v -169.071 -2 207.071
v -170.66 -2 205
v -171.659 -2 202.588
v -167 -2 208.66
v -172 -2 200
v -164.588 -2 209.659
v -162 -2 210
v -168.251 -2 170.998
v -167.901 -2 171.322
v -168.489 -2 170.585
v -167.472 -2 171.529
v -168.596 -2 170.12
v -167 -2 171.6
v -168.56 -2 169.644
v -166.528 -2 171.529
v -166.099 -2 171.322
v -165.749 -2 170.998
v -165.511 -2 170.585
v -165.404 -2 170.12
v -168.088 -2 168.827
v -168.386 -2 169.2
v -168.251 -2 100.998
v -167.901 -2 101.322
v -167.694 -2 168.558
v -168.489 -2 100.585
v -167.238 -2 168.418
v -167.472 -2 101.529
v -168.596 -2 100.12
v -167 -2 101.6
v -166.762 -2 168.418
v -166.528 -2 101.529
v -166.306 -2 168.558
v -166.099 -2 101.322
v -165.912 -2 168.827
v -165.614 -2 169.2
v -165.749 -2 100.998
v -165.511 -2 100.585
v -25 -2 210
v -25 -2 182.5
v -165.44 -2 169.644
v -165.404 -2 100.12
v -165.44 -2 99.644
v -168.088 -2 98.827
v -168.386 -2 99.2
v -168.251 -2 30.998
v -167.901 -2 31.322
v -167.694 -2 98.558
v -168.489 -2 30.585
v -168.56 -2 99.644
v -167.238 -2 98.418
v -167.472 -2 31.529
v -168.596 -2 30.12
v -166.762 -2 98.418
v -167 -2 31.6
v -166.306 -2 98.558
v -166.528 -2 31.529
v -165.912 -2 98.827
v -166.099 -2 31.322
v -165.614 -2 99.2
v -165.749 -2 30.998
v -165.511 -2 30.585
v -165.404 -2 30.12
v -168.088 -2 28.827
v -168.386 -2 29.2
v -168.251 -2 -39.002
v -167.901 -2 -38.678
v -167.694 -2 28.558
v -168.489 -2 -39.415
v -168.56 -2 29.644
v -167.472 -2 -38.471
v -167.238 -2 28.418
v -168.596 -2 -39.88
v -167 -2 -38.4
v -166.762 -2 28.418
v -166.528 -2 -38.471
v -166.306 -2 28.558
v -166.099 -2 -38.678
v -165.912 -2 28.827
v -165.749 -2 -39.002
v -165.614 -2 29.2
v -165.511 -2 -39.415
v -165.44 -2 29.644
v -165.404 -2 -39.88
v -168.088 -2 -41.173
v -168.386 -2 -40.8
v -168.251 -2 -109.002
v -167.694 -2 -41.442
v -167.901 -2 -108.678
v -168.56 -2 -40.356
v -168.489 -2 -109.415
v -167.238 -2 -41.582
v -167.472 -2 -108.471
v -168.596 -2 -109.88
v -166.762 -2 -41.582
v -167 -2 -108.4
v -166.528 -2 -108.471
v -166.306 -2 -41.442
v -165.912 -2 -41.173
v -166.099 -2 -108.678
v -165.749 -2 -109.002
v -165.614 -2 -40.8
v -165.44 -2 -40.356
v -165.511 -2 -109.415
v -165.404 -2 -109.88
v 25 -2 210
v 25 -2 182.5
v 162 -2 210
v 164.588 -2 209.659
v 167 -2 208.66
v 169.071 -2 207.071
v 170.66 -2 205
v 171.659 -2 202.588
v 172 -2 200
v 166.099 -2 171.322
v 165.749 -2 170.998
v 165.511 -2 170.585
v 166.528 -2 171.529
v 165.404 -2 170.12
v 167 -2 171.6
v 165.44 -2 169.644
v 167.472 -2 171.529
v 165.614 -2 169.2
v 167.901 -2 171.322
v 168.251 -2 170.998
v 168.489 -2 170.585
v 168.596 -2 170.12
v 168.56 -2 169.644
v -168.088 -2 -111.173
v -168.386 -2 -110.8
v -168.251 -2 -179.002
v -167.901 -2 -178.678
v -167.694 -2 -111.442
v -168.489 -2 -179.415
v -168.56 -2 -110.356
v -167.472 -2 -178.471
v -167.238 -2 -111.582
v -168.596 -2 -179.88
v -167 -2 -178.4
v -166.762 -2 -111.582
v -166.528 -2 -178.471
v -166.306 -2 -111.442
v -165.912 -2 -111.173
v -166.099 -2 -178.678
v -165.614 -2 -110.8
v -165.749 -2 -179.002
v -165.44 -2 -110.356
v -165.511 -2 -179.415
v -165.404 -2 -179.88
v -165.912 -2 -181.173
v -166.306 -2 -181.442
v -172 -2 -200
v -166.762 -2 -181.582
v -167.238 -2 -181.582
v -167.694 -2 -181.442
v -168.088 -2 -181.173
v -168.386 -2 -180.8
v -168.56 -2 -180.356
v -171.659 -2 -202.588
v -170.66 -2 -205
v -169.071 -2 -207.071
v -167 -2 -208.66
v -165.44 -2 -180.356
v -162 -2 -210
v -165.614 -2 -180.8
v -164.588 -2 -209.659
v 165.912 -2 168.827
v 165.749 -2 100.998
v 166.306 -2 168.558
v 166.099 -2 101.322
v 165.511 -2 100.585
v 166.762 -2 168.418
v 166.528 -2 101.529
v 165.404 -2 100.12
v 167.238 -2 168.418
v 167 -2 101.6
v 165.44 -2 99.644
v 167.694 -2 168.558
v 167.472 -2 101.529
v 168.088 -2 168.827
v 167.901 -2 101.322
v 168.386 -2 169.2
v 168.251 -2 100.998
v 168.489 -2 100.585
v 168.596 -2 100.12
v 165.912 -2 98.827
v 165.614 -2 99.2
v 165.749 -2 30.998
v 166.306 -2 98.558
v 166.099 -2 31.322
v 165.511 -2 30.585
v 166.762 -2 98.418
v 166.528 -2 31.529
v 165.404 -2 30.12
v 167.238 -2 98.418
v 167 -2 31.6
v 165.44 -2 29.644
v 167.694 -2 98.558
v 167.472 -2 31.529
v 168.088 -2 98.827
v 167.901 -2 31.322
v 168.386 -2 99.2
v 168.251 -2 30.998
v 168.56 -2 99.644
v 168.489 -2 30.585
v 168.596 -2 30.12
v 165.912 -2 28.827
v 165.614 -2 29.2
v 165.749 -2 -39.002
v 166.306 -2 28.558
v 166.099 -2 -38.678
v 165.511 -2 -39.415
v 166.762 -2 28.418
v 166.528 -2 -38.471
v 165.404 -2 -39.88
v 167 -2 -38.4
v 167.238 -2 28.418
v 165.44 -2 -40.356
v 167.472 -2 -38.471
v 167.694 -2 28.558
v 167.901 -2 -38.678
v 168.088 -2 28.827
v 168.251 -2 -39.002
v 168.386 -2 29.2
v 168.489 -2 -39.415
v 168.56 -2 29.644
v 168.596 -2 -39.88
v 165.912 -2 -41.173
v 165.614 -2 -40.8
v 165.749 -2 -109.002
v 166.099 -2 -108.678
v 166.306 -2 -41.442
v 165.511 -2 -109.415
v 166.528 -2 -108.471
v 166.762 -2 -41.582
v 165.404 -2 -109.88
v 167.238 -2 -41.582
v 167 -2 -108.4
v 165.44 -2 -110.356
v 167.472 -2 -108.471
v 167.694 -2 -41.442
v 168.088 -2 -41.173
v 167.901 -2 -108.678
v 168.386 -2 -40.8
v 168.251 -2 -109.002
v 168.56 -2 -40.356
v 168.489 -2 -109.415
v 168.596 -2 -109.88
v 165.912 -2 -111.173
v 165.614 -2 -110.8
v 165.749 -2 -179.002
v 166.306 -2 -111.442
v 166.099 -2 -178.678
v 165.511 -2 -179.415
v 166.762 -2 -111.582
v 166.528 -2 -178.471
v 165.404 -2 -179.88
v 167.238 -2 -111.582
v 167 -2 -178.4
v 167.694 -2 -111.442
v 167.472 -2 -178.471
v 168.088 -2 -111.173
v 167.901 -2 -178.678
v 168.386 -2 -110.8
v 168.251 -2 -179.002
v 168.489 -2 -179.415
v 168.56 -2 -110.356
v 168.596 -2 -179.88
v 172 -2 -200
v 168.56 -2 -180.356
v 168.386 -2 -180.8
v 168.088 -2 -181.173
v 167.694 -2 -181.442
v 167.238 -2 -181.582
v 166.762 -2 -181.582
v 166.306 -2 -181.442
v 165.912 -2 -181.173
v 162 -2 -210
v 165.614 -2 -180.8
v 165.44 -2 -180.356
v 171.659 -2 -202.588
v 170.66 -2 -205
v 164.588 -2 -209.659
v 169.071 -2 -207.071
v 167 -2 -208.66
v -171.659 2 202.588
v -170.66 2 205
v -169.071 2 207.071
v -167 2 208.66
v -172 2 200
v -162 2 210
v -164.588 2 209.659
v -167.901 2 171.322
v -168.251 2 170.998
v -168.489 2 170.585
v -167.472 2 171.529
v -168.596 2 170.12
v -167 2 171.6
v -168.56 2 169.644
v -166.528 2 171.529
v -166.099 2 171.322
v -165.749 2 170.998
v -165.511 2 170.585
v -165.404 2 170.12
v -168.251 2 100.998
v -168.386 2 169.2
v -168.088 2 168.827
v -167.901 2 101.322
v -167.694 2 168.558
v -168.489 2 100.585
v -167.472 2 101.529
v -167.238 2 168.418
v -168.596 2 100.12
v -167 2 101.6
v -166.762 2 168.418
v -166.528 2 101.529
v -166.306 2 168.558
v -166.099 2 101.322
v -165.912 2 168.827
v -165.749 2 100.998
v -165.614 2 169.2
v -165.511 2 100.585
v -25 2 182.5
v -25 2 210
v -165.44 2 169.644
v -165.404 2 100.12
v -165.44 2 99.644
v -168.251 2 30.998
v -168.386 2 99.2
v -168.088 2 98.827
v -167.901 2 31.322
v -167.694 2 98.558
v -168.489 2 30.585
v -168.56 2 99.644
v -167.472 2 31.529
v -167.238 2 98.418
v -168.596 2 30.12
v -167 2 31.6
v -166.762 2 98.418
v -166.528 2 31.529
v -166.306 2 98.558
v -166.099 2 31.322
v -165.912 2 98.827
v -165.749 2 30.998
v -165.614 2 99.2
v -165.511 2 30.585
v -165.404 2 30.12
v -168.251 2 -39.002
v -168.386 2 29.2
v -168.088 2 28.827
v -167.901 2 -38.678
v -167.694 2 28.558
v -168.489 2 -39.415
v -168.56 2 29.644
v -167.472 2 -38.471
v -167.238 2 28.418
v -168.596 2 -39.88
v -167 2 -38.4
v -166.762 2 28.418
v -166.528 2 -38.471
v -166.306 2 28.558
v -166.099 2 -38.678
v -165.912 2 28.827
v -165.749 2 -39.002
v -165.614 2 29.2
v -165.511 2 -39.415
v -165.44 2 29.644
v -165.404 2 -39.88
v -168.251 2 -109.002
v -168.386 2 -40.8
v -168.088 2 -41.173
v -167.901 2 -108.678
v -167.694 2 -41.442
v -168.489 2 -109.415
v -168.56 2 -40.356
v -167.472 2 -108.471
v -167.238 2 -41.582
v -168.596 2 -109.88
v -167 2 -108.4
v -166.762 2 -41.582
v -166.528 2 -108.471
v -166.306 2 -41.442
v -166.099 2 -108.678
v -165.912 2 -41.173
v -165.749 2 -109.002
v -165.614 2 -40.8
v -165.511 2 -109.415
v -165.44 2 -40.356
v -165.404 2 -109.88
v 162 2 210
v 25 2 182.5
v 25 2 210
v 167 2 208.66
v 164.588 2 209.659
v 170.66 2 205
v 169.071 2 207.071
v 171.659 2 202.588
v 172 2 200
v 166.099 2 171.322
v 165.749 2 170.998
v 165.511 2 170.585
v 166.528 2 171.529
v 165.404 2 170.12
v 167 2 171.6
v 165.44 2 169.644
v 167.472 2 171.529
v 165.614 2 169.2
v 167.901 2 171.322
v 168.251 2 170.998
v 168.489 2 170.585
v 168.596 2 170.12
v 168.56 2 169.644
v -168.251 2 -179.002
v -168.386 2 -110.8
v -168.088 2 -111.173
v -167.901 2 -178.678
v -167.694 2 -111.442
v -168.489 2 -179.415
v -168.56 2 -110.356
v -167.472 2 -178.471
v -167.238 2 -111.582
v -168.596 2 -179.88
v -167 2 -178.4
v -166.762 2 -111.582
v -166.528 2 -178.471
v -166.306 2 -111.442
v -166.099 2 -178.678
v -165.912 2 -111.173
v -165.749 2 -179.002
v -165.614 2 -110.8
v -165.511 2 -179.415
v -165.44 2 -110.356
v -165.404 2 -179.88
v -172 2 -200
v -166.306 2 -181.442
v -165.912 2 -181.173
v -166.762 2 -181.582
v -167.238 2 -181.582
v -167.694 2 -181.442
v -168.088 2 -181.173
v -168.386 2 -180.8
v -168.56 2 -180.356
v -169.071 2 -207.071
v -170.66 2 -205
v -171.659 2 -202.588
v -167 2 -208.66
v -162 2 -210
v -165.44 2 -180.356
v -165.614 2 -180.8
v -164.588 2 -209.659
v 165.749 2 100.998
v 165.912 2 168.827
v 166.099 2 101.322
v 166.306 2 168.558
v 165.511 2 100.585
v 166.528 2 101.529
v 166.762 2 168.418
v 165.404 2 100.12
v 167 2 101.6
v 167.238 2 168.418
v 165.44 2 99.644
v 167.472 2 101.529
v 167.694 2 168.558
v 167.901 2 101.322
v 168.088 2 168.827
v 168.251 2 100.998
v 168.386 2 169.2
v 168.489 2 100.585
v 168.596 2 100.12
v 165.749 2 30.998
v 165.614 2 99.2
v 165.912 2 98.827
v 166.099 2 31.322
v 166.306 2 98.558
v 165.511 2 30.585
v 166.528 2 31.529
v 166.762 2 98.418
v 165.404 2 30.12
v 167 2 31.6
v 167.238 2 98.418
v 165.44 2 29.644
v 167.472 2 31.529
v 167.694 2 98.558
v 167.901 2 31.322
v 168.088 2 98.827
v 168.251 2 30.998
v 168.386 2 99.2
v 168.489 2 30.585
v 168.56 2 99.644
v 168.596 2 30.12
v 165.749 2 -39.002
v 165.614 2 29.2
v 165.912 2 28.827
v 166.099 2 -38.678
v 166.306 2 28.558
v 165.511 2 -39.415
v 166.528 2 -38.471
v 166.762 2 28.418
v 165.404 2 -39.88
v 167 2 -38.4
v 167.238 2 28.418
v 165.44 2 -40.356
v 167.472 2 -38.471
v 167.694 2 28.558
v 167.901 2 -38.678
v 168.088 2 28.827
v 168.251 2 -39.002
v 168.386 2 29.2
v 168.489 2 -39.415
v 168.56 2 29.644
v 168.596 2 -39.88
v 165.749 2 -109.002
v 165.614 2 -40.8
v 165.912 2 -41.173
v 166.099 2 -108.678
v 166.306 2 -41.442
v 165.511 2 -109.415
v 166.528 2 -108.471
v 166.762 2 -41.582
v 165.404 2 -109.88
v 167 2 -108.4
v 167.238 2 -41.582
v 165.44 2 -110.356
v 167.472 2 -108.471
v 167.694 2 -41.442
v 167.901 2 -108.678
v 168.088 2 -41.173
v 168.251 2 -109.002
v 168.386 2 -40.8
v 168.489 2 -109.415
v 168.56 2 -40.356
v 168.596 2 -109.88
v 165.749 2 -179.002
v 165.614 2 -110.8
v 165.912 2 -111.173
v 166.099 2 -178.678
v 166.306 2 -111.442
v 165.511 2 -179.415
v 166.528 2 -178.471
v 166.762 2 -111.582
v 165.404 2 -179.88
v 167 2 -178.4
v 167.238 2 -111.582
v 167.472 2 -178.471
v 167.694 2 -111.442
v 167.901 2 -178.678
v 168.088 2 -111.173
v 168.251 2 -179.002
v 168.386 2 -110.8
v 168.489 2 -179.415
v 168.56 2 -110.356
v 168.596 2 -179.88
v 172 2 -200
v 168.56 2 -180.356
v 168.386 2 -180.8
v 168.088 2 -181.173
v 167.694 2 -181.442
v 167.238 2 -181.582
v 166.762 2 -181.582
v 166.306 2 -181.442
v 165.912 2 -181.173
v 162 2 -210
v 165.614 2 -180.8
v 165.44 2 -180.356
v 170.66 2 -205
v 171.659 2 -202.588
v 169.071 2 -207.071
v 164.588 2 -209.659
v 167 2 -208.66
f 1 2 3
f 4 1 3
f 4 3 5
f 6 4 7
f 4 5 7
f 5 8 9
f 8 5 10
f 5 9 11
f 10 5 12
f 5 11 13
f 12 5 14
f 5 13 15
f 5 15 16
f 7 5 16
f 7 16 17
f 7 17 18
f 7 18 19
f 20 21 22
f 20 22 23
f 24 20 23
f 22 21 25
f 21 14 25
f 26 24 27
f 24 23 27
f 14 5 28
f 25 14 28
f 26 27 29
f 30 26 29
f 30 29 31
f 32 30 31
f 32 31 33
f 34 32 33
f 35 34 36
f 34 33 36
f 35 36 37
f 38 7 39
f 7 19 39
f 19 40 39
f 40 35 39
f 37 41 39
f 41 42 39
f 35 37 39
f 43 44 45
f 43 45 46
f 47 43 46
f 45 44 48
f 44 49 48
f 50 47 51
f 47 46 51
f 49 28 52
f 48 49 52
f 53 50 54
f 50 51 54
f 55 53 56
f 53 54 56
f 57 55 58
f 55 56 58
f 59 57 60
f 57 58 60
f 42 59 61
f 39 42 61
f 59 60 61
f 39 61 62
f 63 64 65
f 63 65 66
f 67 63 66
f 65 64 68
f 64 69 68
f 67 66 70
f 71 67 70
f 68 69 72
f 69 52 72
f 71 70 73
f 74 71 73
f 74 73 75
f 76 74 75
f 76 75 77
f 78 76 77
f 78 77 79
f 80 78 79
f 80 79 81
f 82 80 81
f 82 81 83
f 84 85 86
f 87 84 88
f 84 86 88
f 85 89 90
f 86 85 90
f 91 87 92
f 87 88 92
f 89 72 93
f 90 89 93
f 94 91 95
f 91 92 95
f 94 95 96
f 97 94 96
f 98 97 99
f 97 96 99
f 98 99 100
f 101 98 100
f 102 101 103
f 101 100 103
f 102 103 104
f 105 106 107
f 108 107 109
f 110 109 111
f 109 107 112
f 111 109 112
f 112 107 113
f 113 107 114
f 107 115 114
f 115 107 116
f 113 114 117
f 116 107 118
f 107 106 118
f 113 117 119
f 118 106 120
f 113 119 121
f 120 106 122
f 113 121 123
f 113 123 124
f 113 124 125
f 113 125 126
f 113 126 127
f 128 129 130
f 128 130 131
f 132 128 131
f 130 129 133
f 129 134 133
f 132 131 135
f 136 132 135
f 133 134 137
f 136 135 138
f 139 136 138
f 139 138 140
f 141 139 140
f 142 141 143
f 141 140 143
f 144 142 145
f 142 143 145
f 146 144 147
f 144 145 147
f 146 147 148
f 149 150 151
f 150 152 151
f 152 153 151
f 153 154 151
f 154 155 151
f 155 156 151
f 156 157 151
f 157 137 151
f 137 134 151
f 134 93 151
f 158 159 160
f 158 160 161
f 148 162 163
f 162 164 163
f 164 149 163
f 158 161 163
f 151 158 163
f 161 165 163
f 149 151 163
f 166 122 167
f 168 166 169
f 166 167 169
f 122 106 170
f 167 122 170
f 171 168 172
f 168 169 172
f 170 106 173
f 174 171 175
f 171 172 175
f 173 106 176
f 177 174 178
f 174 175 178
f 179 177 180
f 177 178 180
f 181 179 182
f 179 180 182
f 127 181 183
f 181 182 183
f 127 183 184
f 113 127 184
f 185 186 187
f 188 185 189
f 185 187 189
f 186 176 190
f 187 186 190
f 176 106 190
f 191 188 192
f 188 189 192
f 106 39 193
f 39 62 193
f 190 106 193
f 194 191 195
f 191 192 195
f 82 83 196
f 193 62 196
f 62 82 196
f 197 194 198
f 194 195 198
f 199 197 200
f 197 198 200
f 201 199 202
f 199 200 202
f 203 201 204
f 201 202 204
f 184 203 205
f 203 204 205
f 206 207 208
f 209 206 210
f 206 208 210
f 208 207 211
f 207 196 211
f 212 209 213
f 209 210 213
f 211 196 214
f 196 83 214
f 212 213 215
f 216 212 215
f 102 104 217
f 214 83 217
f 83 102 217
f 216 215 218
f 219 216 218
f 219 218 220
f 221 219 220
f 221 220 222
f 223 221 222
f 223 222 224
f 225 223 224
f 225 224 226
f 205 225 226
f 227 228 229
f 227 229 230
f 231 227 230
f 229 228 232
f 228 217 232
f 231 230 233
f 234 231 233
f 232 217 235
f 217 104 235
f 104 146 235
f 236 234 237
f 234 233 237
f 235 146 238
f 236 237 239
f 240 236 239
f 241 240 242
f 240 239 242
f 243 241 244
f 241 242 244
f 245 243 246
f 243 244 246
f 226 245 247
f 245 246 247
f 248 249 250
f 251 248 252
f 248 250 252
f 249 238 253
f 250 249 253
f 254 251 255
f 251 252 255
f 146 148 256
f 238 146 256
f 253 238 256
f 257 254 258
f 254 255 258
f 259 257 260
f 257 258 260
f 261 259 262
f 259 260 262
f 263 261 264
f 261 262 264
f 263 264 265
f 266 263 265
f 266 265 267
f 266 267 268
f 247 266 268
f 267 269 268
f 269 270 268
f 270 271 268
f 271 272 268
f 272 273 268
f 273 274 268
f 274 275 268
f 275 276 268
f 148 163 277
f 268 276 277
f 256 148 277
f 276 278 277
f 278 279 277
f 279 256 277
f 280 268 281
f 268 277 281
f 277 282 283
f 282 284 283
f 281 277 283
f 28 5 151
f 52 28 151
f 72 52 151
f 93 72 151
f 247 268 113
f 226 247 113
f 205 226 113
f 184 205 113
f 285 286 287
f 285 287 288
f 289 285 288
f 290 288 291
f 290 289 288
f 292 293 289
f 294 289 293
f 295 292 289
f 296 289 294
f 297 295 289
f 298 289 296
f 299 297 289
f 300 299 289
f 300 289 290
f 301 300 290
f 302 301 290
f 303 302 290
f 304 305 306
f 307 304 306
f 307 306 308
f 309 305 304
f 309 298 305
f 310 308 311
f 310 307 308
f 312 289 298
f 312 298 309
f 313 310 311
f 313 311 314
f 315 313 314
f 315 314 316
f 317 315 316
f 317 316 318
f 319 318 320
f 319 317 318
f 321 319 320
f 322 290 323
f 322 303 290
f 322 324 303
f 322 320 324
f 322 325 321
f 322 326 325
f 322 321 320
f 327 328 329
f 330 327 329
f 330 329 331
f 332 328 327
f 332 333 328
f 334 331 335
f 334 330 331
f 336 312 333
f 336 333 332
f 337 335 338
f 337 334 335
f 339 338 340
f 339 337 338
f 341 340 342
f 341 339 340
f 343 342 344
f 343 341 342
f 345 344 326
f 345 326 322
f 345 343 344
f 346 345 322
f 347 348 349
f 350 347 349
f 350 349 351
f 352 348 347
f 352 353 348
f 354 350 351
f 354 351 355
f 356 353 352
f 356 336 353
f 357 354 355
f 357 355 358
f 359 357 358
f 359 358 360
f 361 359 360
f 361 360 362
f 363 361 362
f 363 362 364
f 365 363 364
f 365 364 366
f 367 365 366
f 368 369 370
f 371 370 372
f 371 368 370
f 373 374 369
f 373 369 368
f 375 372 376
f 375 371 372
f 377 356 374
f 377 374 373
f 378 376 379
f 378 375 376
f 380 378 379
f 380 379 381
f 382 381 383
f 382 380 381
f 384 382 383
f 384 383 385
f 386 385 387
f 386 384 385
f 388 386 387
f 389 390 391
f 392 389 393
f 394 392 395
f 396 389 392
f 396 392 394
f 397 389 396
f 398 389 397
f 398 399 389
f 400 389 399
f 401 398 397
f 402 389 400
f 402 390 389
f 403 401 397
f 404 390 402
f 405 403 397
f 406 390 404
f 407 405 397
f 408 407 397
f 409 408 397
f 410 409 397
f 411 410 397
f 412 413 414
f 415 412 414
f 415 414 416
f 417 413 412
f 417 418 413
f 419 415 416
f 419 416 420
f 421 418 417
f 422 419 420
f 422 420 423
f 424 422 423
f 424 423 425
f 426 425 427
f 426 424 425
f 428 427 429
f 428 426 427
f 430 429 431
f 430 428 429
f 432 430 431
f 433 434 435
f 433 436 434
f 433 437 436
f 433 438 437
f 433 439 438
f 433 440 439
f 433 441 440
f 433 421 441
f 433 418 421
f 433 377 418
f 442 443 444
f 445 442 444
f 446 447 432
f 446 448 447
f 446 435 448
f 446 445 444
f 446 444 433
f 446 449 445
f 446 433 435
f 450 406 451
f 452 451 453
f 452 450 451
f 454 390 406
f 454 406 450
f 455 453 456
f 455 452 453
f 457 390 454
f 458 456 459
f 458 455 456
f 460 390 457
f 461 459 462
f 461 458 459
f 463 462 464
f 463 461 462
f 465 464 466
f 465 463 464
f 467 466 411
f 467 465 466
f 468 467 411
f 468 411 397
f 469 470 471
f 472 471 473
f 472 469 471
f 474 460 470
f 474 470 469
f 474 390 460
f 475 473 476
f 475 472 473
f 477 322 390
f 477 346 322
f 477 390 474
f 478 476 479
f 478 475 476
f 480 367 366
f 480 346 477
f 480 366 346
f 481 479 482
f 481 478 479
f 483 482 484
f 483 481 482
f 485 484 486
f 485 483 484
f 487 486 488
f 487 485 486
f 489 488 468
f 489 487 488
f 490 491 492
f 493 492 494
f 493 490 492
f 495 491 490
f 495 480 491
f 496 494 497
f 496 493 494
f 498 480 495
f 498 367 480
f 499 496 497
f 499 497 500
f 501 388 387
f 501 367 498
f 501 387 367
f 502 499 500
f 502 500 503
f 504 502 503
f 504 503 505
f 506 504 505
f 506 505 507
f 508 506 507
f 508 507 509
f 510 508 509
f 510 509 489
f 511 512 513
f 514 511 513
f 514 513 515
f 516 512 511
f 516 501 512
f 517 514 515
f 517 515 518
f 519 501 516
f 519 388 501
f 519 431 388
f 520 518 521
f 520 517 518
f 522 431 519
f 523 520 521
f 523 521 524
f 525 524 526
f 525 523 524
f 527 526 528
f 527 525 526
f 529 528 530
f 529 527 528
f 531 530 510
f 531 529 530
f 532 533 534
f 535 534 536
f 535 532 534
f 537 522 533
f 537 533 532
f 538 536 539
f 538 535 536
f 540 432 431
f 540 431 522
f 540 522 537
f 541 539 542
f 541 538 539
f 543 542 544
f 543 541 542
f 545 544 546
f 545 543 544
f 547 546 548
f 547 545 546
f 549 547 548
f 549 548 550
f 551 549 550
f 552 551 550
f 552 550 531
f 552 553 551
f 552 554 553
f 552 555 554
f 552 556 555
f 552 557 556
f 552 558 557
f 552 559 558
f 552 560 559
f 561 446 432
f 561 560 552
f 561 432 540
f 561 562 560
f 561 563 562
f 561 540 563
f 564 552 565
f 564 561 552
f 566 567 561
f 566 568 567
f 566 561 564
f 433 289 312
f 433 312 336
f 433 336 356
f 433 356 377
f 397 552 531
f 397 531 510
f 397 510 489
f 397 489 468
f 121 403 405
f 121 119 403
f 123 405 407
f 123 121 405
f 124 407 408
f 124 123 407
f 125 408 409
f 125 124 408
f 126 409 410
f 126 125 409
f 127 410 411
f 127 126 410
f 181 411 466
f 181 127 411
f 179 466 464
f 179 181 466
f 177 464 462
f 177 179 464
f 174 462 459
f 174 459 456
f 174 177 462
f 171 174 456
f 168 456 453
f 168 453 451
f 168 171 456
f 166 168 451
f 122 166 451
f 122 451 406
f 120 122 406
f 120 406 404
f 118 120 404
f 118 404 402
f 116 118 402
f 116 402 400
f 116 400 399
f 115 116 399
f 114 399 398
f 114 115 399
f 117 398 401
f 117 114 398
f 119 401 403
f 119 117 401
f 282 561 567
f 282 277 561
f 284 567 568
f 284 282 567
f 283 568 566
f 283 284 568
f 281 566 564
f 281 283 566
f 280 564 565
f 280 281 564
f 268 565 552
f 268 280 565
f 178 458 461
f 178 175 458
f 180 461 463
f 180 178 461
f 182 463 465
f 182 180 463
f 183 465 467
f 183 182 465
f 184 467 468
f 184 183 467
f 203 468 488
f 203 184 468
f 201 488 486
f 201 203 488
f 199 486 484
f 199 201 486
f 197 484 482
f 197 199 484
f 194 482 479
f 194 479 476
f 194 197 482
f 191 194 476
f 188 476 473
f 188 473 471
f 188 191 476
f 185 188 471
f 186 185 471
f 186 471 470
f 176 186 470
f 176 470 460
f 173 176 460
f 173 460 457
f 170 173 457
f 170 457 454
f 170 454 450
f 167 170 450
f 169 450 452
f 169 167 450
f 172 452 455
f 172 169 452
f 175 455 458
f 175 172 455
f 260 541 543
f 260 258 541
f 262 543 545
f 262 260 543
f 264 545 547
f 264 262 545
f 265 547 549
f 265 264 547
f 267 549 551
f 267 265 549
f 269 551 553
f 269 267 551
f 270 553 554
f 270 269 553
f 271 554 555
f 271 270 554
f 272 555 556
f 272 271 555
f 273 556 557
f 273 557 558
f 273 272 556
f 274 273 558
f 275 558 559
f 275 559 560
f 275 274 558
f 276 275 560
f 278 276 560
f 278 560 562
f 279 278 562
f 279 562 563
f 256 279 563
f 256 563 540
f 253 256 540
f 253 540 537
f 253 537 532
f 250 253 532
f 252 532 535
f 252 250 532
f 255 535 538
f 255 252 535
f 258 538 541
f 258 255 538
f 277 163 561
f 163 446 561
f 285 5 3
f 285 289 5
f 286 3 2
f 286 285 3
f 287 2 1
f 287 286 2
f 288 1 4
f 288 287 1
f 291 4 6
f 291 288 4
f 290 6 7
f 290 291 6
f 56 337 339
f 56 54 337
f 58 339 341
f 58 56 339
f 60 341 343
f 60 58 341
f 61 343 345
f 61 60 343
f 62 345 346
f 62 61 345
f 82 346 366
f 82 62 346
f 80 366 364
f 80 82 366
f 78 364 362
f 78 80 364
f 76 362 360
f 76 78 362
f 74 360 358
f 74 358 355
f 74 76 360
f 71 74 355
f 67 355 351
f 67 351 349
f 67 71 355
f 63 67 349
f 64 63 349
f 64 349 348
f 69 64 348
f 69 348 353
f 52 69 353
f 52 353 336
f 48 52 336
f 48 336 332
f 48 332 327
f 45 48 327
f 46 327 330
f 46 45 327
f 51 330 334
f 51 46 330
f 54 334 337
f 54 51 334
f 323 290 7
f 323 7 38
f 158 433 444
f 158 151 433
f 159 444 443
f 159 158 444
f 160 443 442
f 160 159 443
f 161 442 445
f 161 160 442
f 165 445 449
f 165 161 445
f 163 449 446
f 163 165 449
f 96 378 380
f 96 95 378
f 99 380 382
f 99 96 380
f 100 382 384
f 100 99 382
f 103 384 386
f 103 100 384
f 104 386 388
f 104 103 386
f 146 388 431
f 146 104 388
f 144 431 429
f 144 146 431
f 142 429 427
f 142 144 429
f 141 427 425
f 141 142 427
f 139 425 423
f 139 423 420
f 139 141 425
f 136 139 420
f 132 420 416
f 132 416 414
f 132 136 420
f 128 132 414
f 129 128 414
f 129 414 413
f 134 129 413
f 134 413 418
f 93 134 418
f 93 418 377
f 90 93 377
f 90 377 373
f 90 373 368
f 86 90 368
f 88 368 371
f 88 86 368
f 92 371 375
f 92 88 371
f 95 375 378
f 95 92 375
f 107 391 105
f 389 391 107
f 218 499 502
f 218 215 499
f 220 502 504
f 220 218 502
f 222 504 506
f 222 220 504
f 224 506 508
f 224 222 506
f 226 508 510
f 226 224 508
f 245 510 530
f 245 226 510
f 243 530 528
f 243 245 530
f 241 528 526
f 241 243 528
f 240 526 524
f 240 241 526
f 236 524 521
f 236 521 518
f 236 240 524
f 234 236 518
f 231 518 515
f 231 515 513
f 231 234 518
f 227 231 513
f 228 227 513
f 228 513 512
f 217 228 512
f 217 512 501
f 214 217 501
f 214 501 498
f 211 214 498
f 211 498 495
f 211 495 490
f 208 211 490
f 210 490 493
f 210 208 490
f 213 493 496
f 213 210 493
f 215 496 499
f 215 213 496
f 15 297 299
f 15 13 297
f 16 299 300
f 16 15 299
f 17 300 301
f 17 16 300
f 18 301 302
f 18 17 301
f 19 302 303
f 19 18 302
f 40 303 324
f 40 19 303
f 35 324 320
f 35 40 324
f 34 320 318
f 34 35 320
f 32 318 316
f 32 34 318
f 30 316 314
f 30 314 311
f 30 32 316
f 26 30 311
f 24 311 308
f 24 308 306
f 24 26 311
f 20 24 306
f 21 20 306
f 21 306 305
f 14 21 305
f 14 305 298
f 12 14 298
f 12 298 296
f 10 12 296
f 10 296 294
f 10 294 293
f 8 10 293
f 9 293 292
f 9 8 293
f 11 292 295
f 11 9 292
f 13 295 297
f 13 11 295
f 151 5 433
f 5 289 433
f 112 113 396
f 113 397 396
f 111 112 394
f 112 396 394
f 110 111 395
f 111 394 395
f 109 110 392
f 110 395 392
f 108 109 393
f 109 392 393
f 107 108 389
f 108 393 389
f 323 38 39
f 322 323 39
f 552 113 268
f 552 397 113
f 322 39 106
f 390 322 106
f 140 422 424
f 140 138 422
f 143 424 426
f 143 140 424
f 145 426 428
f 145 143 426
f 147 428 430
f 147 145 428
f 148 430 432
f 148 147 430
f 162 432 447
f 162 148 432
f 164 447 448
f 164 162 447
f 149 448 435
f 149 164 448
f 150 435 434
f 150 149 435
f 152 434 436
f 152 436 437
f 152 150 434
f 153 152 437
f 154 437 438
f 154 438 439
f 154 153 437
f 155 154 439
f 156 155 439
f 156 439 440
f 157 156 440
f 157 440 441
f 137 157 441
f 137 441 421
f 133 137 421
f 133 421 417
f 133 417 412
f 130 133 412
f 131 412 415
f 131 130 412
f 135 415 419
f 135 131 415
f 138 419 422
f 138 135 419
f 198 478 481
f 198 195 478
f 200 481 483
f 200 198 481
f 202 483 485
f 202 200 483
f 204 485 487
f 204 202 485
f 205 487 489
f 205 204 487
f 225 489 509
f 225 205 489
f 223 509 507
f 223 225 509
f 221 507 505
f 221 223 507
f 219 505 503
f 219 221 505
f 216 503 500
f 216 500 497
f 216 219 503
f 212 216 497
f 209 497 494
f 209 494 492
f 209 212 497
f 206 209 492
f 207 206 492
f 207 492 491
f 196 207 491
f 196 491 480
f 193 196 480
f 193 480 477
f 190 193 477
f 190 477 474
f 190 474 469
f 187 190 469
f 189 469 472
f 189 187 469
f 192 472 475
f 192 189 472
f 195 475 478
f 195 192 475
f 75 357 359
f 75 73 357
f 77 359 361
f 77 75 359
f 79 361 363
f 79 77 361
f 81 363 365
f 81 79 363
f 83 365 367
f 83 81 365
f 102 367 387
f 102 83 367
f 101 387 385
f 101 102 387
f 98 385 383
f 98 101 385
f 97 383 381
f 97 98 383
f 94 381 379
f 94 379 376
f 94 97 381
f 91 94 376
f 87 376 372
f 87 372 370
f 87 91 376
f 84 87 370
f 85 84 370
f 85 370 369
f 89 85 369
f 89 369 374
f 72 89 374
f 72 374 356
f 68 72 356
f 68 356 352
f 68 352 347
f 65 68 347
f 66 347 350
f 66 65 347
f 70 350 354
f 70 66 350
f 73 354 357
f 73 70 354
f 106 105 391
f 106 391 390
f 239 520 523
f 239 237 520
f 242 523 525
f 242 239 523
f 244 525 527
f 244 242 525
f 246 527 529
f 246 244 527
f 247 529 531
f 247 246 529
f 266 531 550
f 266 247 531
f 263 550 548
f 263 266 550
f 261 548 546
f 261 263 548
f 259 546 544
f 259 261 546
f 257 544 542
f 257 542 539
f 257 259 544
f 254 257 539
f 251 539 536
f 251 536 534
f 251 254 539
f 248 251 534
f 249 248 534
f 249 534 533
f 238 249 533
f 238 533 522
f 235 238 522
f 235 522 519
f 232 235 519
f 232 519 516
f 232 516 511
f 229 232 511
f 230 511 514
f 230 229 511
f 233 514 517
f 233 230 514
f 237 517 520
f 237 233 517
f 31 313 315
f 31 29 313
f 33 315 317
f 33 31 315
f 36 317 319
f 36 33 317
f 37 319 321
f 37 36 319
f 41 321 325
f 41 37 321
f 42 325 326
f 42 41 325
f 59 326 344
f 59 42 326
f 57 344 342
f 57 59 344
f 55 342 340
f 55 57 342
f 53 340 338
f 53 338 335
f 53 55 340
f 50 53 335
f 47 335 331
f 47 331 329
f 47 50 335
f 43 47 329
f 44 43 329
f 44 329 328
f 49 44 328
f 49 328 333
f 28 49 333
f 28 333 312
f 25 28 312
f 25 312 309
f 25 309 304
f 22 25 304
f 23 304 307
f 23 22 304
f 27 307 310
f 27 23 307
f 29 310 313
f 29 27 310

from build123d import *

# Parameters (mm, degrees)
SKETCH_1_W               = 344
SKETCH_1_H               = 420
SKETCH_1_R               = 1.6
EXTRUDE_1_DEPTH          = 2
CUT_EXTRUDE_1_DEPTH      = 272.455337026
CUT_EXTRUDE_1_DEPTH_BACK = 272.455337026
SKETCH_2_W               = 50
SKETCH_2_H               = 27.5
FILLET_1_R               = 10


with BuildPart() as part:
    # 草图1 → 凸台-拉伸1 (new, symmetric)
    with BuildSketch(Plane(origin=(0, 0, 0), x_dir=(1, 0, 0), z_dir=(0, 1, 0))):
        Rectangle(SKETCH_1_W, SKETCH_1_H)
        with Locations(Location((-167, -170, 0), (0, 0, 270))):
            Circle(SKETCH_1_R, mode=Mode.SUBTRACT)
        with Locations(Location((167, -170, 0), (0, 0, 270))):
            Circle(SKETCH_1_R, mode=Mode.SUBTRACT)
        with Locations(Location((-167, -100, 0), (0, 0, 270))):
            Circle(SKETCH_1_R, mode=Mode.SUBTRACT)
        with Locations(Location((-167, -30, 0), (0, 0, 270))):
            Circle(SKETCH_1_R, mode=Mode.SUBTRACT)
        with Locations(Location((-167, 40, 0), (0, 0, 270))):
            Circle(SKETCH_1_R, mode=Mode.SUBTRACT)
        with Locations(Location((-167, 110, 0), (0, 0, 270))):
            Circle(SKETCH_1_R, mode=Mode.SUBTRACT)
        with Locations(Location((-167, 180, 0), (0, 0, 270))):
            Circle(SKETCH_1_R, mode=Mode.SUBTRACT)
        with Locations(Location((167, -100, 0), (0, 0, 270))):
            Circle(SKETCH_1_R, mode=Mode.SUBTRACT)
        with Locations(Location((167, -30, 0), (0, 0, 270))):
            Circle(SKETCH_1_R, mode=Mode.SUBTRACT)
        with Locations(Location((167, 40, 0), (0, 0, 270))):
            Circle(SKETCH_1_R, mode=Mode.SUBTRACT)
        with Locations(Location((167, 110, 0), (0, 0, 270))):
            Circle(SKETCH_1_R, mode=Mode.SUBTRACT)
        with Locations(Location((167, 180, 0), (0, 0, 270))):
            Circle(SKETCH_1_R, mode=Mode.SUBTRACT)
    extrude(amount=EXTRUDE_1_DEPTH, both=True)

    # 草图2 → 切除-拉伸1 (cut, two sides: drawn at the far end of the back side and taken through both)
    with BuildSketch(Plane(origin=(0, 0, 0), x_dir=(1, 0, 0), z_dir=(0, 1, 0)).offset(-CUT_EXTRUDE_1_DEPTH_BACK)):
        with Locations((0, -196.25)):
            Rectangle(SKETCH_2_W, SKETCH_2_H)
    extrude(amount=CUT_EXTRUDE_1_DEPTH + CUT_EXTRUDE_1_DEPTH_BACK, mode=Mode.SUBTRACT)

    # 圆角1
    fillet_1_edges = [part.edges().sort_by_distance(p)[0] for p in [
        (-172, 0, -210),
        (172, 0, -210),
        (172, 0, 210),
        (-172, 0, 210),
    ]]
    fillet(fillet_1_edges, radius=FILLET_1_R)


solid = part.part
